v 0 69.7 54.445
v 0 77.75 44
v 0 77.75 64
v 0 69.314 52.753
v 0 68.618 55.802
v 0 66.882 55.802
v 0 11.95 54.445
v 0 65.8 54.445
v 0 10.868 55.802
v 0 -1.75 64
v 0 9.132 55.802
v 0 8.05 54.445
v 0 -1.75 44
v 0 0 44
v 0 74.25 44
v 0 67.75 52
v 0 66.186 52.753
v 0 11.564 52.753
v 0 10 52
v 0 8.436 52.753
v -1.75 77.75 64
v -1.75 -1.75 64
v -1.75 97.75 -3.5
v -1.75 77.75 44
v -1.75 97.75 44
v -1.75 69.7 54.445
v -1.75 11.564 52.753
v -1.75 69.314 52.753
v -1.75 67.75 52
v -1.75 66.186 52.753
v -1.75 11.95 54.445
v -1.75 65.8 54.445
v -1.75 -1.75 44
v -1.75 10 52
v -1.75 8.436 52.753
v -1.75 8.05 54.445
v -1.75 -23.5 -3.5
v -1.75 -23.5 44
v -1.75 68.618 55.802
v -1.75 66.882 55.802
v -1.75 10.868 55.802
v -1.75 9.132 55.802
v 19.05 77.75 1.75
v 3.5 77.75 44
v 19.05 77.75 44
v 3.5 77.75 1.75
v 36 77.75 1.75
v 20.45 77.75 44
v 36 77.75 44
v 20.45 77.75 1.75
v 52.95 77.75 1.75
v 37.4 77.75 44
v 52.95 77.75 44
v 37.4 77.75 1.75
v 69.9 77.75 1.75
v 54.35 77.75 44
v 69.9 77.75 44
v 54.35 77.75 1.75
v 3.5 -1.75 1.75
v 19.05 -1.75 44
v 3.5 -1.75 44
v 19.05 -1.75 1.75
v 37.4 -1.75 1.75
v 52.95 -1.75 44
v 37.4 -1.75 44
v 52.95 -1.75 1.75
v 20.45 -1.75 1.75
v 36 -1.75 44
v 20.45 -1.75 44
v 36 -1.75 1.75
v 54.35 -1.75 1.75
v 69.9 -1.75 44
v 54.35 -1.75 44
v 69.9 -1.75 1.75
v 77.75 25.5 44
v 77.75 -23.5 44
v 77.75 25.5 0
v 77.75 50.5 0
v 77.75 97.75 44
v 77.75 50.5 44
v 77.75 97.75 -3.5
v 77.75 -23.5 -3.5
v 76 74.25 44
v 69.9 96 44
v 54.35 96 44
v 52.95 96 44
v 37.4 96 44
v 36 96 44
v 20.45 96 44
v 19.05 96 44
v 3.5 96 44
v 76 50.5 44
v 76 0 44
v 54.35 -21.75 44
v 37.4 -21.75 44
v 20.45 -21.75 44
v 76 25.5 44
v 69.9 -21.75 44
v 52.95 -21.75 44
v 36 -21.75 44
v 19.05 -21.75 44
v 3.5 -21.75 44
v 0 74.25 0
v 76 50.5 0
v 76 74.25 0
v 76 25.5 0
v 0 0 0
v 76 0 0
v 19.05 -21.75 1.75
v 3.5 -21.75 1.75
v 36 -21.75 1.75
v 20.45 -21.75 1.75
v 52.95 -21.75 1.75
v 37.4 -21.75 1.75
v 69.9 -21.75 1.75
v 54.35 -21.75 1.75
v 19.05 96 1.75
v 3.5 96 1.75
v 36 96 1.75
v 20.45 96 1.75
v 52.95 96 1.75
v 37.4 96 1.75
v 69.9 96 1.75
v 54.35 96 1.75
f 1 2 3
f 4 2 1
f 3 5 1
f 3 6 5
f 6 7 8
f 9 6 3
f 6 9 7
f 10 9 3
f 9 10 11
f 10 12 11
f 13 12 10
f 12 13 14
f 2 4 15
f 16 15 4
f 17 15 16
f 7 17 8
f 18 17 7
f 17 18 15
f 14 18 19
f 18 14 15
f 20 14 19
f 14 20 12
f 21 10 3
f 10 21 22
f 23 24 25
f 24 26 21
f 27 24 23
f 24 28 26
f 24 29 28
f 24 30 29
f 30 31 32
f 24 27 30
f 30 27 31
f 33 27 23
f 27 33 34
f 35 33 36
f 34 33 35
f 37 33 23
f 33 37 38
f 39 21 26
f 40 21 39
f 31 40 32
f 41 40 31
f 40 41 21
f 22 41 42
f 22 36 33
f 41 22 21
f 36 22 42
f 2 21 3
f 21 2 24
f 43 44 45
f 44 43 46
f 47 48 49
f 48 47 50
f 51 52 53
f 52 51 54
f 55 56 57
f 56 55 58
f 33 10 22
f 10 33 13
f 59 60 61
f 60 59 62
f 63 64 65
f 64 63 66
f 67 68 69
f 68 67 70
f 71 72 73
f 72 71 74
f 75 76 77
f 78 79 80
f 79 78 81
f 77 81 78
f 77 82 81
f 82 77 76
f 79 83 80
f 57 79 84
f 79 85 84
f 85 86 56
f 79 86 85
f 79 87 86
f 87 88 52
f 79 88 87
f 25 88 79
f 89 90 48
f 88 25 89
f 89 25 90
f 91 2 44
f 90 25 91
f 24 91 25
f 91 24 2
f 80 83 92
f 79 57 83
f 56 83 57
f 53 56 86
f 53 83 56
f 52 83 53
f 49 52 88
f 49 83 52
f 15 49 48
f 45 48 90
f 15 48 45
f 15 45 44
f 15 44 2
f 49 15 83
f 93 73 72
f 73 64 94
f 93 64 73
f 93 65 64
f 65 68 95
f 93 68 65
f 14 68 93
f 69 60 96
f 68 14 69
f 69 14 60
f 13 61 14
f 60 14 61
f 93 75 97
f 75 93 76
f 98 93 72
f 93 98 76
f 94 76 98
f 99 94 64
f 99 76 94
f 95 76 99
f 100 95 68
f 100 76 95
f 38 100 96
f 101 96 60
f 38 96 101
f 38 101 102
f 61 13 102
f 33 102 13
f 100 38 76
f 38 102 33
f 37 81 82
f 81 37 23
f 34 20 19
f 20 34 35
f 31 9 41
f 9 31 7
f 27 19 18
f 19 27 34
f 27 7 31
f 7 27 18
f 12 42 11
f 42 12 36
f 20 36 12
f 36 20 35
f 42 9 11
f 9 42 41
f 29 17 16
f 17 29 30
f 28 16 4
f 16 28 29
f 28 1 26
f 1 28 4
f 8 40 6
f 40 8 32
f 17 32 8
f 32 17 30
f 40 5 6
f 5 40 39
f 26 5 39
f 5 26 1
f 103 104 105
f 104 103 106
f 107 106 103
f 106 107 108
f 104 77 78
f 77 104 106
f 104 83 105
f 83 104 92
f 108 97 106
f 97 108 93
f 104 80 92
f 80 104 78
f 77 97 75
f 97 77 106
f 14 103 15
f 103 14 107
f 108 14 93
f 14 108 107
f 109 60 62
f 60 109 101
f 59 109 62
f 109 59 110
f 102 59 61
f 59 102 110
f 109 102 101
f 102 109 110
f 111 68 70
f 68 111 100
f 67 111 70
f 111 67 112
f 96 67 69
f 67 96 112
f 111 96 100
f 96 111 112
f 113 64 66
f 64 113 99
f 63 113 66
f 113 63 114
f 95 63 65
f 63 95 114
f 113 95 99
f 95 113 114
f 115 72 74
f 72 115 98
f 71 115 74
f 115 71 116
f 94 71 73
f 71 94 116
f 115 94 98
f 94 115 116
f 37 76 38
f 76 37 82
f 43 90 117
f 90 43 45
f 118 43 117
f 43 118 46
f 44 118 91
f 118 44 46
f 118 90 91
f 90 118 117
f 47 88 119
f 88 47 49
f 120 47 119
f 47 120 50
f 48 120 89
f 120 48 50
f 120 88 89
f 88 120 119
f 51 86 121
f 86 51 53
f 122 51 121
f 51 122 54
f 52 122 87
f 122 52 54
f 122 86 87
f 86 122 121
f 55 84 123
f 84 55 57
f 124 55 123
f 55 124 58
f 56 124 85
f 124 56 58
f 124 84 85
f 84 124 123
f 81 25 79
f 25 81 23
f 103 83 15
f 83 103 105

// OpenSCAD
thickness=1.75;
post_it_width=76;
post_it_hight=44;
pen_width=20;

module post_it_box() {
    cube([post_it_width, post_it_width, post_it_hight]);
}

module post_it_holder() {
    difference() {
        union() {
            translate([-thickness,-thickness,0])
                cube([thickness, post_it_width+thickness*2, post_it_hight+20]);
            translate([-thickness,-thickness,-thickness*2])
                cube([post_it_width+thickness*2, post_it_width+thickness*2, post_it_hight+thickness*2]);
        }
        union() {
            translate([-10,10,post_it_hight+10])
                rotate([0,90,0])
                    cylinder(h=10, d=4);
            translate([-10,post_it_width+thickness-10,post_it_hight+10])
                rotate([0,90,0])
                    cylinder(h=10, d=4);
            translate([post_it_width,post_it_width/2-12.5,0])
                cube([thickness,25,post_it_hight]);
            post_it_box();
        }
    }
}
module pen_holder()
{
    difference() {
        union() {
            translate([-thickness,-thickness*2,-thickness*2])
                cube([post_it_width+thickness*2, pen_width+thickness*2, post_it_hight+thickness*2]);
        }
        union() {
            for (i=[0,1,2,3]) {
                translate([i*(post_it_width/5+thickness)+thickness*2,-thickness,thickness])
                    cube([(post_it_width+thickness)/5, pen_width, post_it_hight+thickness*2]);
            }
        }
    }
}



post_it_holder();

translate([0, -pen_width,0])
    pen_holder();
translate([0, post_it_width+thickness,0])
    pen_holder();
